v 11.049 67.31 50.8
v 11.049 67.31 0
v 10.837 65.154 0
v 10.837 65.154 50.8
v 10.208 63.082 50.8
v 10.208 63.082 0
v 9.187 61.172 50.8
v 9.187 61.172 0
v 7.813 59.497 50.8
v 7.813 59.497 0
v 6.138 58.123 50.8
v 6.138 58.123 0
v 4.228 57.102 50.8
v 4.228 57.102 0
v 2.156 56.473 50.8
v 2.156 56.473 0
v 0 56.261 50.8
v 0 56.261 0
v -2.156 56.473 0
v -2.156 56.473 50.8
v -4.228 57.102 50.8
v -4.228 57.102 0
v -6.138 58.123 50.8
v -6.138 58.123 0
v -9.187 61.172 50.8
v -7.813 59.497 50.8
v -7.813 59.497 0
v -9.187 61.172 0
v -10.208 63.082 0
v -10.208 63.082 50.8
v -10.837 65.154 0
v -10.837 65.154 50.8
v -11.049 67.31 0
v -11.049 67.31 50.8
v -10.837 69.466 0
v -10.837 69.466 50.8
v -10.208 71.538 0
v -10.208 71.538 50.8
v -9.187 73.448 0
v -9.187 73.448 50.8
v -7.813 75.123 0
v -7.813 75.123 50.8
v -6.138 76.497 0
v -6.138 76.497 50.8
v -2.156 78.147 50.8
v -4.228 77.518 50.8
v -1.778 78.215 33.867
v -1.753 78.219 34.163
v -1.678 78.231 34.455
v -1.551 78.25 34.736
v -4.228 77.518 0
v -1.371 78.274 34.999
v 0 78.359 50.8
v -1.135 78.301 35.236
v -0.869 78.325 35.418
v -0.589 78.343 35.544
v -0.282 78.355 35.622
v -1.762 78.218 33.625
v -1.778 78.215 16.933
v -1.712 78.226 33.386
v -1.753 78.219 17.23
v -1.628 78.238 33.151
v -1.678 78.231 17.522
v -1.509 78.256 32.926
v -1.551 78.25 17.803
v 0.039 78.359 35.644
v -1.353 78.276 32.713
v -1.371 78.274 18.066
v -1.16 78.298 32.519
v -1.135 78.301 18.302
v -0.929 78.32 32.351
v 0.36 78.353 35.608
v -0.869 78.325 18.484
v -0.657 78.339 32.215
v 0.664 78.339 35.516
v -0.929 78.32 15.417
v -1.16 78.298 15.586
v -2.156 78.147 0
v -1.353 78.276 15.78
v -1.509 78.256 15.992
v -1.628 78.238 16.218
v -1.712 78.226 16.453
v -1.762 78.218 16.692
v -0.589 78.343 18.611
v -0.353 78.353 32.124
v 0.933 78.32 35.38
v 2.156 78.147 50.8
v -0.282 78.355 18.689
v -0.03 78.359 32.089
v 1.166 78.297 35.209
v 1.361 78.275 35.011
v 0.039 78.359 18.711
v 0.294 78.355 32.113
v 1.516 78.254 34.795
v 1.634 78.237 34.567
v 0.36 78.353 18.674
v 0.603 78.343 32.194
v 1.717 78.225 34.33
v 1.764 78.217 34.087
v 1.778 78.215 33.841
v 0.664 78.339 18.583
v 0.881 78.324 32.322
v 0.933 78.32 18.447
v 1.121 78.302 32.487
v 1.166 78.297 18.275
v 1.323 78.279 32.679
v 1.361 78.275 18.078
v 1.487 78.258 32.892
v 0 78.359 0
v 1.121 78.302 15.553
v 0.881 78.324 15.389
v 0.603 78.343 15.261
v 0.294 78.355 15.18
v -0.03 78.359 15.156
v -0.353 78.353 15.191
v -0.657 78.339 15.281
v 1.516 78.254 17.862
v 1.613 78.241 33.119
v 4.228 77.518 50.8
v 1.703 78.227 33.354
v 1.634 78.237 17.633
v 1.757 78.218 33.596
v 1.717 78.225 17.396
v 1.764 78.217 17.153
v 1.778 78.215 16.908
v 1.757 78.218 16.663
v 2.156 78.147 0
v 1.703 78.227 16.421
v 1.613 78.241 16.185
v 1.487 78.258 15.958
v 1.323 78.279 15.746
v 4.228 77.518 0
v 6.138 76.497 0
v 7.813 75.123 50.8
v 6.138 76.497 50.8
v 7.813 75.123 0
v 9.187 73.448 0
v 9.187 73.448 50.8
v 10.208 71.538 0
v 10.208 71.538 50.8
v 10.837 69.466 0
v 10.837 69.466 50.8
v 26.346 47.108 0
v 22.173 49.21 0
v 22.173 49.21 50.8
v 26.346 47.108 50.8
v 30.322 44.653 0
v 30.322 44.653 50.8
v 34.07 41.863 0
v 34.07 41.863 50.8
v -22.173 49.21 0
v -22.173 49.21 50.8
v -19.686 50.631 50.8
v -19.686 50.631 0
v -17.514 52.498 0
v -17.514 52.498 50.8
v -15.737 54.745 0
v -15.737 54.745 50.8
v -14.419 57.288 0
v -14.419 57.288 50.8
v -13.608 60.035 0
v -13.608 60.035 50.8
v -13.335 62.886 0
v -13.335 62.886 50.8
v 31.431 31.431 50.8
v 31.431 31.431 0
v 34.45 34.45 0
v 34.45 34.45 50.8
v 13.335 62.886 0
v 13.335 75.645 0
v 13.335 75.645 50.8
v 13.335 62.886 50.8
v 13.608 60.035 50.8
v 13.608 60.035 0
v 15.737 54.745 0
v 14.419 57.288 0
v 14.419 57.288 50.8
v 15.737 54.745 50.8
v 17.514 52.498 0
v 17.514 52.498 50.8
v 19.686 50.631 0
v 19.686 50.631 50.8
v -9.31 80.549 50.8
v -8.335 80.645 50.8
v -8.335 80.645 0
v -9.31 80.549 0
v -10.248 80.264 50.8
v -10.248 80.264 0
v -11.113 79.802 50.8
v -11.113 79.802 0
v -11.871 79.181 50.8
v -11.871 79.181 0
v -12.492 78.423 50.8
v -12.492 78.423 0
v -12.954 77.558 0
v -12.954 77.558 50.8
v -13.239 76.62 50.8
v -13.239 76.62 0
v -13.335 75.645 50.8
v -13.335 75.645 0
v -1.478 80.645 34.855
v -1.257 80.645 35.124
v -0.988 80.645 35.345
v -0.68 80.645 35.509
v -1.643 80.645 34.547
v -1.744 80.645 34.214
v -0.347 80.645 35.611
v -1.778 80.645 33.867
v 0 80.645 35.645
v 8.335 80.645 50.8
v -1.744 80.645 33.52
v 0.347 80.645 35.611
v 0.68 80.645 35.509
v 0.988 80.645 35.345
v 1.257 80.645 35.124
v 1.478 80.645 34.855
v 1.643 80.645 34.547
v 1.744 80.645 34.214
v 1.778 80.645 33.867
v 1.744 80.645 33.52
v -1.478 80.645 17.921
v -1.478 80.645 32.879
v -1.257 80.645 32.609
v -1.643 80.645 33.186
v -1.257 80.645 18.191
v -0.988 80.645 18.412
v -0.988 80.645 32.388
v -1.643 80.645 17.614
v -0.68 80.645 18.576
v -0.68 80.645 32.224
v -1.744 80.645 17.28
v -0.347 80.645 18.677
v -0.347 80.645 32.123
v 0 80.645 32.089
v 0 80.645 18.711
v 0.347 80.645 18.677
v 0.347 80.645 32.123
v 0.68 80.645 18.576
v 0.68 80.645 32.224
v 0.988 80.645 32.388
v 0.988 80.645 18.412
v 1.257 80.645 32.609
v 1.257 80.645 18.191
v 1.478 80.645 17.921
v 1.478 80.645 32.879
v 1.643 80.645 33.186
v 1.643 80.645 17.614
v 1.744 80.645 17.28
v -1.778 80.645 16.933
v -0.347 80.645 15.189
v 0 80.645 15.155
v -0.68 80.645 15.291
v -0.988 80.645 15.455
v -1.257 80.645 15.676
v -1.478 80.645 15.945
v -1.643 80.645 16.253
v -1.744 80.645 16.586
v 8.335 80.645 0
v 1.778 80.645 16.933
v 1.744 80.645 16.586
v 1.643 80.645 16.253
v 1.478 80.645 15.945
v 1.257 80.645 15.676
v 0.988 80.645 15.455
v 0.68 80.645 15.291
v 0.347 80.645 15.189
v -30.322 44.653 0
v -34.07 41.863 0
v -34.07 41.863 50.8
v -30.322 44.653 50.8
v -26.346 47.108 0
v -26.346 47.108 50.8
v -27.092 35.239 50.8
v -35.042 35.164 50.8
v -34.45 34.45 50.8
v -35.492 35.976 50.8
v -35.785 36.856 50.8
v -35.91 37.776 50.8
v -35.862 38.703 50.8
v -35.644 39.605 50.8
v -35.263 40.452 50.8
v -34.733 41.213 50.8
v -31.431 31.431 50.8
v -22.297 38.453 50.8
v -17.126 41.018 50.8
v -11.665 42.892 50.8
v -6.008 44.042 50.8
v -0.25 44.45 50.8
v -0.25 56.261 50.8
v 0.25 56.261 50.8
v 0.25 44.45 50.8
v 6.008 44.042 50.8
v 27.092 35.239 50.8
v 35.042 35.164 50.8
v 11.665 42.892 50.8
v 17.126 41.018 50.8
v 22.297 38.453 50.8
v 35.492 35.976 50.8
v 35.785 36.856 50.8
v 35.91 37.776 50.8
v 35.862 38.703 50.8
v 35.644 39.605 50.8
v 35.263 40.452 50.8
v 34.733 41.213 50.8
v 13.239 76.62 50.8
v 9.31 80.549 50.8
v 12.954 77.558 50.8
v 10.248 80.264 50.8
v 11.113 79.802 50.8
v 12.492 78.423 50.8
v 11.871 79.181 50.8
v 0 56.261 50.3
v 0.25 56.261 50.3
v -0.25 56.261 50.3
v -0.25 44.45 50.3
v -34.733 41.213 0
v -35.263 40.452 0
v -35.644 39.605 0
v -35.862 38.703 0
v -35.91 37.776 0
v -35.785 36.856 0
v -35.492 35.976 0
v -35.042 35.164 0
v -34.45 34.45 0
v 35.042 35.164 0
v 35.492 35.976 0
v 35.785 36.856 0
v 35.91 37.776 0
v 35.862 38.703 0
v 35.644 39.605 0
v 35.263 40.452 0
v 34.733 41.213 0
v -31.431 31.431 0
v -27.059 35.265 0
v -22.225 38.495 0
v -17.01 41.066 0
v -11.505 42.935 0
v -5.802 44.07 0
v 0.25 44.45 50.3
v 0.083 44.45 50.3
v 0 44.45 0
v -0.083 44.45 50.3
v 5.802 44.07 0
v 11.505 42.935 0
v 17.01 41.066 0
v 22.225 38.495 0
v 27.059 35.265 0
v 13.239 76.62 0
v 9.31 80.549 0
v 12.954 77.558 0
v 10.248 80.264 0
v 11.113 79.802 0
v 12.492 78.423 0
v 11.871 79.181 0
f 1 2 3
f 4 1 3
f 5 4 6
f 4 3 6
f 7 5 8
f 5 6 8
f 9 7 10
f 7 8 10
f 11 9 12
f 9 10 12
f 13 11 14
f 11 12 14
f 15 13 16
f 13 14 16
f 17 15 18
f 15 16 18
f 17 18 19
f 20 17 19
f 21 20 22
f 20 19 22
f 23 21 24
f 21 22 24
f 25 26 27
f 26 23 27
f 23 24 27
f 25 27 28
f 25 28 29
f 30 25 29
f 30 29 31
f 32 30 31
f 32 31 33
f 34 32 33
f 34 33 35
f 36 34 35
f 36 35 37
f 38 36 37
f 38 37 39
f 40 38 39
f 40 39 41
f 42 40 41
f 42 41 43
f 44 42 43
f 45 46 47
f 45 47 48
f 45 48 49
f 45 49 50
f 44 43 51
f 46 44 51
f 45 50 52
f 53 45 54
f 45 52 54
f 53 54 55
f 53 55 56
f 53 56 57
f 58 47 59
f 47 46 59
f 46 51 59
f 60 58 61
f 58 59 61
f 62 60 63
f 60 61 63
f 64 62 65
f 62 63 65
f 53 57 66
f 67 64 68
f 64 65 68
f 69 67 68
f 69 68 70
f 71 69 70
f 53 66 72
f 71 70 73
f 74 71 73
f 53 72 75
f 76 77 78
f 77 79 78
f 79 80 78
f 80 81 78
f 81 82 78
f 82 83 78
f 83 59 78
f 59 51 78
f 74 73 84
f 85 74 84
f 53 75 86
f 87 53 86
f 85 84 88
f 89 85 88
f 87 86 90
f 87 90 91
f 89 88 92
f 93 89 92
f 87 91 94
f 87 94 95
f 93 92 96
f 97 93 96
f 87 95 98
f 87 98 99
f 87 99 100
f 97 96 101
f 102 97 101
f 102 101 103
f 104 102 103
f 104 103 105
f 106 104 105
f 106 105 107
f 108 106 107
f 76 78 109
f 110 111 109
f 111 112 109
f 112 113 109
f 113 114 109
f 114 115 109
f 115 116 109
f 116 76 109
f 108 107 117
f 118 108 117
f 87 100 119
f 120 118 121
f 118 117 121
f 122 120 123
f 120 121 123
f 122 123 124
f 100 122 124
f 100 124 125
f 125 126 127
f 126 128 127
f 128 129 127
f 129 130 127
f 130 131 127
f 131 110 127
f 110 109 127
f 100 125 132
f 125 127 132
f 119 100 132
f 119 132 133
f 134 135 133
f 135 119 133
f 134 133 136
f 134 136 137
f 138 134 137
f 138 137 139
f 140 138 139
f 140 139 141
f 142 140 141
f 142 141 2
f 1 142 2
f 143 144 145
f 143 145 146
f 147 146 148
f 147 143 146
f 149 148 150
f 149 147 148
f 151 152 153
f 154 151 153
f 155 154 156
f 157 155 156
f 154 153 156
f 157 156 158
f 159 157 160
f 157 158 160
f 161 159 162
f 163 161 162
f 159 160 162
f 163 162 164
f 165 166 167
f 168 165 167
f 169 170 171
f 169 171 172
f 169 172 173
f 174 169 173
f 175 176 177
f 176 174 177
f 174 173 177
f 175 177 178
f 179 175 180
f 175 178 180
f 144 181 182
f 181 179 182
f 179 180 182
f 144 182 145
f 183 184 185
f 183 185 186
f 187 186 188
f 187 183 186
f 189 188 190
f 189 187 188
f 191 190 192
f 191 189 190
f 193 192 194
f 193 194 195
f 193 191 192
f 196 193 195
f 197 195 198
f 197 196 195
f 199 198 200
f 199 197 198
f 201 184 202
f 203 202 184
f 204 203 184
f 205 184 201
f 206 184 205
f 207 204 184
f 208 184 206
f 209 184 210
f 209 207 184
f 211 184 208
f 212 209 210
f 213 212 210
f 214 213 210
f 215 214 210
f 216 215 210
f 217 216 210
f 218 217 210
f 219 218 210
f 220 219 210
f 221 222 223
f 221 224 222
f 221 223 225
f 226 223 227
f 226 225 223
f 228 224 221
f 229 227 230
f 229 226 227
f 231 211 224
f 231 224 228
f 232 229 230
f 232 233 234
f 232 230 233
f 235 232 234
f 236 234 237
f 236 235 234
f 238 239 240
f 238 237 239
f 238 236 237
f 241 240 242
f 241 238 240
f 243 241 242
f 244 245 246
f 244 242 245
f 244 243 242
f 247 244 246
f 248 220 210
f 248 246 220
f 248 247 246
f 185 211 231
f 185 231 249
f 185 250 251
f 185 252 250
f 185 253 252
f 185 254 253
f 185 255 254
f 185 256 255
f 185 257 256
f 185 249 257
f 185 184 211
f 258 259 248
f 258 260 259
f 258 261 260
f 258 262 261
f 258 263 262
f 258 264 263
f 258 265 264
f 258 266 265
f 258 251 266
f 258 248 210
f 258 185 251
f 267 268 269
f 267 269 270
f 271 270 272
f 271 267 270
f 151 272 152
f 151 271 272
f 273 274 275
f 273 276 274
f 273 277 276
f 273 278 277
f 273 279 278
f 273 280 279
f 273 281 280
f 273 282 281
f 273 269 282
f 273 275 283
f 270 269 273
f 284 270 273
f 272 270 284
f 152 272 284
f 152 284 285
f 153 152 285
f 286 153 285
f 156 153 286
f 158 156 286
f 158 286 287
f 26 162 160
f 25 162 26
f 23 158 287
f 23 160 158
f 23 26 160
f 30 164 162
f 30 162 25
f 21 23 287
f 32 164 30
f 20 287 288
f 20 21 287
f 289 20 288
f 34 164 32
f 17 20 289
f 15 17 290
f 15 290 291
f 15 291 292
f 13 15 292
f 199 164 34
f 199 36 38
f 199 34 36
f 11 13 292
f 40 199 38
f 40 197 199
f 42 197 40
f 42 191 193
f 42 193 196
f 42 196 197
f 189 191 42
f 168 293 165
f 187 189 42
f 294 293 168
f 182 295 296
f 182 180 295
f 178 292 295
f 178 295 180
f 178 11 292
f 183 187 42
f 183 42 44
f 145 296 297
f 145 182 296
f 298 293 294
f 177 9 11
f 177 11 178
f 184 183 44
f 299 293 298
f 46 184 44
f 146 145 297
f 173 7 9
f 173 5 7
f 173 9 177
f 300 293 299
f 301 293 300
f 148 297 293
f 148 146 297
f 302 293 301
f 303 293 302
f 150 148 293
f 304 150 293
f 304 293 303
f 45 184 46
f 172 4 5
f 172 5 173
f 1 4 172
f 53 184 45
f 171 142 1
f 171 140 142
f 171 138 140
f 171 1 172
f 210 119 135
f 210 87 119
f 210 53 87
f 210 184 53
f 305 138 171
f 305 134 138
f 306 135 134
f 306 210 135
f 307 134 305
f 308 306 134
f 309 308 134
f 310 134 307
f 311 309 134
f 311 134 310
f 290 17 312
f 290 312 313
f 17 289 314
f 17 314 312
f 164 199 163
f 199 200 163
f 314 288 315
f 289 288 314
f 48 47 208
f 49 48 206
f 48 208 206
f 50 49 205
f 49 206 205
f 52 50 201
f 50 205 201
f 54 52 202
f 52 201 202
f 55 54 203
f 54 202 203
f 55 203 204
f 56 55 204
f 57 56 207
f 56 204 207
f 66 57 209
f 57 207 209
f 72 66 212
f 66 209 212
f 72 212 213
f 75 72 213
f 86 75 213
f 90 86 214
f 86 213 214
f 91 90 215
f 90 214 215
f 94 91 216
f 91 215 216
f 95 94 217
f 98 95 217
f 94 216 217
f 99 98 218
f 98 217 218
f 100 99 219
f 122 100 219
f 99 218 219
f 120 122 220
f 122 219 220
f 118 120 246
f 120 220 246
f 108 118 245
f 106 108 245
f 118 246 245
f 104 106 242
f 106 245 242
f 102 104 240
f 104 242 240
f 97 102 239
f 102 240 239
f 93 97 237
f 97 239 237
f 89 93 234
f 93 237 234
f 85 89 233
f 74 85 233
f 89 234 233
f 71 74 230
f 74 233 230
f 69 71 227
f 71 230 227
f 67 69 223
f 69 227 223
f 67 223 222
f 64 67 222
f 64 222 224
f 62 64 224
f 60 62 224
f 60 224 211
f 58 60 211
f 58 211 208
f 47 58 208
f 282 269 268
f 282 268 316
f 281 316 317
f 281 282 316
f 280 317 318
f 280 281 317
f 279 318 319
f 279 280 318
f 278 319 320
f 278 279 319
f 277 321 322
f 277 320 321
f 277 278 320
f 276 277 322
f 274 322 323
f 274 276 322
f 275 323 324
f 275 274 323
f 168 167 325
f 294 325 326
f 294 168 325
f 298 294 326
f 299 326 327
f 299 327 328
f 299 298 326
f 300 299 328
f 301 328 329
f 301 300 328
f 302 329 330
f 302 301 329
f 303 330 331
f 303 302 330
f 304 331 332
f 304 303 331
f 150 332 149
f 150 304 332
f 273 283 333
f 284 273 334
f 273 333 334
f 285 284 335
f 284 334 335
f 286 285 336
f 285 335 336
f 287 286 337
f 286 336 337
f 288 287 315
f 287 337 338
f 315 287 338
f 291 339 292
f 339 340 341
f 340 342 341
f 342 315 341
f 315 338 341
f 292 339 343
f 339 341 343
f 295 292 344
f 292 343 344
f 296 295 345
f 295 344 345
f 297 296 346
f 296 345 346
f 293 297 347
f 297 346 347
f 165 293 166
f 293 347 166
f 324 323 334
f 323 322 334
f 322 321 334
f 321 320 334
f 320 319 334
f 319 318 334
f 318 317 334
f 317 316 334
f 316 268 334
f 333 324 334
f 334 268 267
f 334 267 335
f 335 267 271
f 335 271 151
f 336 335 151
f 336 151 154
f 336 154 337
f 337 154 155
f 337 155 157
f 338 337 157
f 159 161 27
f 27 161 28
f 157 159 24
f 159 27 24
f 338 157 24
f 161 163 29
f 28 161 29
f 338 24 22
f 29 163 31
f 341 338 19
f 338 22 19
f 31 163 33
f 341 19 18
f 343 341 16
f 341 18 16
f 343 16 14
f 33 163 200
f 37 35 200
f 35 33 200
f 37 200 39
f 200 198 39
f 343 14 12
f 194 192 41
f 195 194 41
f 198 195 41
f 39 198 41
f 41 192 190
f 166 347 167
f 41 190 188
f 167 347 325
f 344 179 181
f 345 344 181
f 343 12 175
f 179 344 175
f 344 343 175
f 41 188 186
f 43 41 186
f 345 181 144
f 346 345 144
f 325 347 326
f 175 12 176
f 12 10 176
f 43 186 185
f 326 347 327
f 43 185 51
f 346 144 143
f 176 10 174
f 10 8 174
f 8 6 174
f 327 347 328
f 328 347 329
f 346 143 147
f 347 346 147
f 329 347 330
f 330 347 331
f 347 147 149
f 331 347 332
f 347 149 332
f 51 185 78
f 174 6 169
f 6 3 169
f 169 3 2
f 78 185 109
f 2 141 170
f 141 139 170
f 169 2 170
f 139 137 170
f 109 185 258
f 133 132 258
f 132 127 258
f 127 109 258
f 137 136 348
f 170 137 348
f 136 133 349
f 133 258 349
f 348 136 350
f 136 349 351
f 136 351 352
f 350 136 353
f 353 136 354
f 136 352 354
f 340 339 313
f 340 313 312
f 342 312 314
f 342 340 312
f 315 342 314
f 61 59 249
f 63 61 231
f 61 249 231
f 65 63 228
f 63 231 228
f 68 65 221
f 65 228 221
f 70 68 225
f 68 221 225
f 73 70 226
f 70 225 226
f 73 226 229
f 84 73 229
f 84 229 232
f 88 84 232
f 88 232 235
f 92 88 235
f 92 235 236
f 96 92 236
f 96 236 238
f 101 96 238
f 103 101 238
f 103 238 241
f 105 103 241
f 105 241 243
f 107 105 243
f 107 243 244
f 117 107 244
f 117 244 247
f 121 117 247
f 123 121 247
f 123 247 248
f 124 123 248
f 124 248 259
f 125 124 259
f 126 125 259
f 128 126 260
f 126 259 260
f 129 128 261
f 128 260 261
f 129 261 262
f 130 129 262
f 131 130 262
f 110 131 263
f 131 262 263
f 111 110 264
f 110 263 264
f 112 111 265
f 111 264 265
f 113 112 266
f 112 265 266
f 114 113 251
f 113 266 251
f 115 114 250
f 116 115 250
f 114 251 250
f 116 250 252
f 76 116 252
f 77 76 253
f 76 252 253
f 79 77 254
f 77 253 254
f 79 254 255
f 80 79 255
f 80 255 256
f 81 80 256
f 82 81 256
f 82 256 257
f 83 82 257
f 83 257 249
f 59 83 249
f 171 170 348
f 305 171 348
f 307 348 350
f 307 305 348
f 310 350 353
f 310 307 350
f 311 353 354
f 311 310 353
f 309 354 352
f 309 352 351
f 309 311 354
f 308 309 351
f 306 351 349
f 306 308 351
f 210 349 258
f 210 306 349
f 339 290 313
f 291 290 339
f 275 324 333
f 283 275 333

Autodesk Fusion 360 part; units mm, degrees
sketch "Sketch1" plane through (0, 0, 0) normal (0, 0, 1) x (1, 0, 0)
  circle A0 centre (0, 0) radius 44.45
  arc A1 (38.1661, 38.1661) -> (-38.1661, 38.1661) centre (0, 0) ccw
  line L0 (0, 0) -> (38.1661, 38.1661) construction
  line L1 (0, 0) -> (-38.1661, 38.1661) construction
  line L2 (-38.1661, 38.1661) -> (-31.4309, 31.4309) construction
  line L3 (-38.1661, 38.1661) -> (-31.4309, 31.4309)
  line L4 (31.4309, 31.4309) -> (38.1661, 38.1661)
  line L5 (0, 0) -> (0, 53.975) construction
  line L6 (0, 53.975) -> (-31.4309, 31.4309) construction
  line L7 (0, 53.975) -> (31.4309, 31.4309) construction
  line L8 (-13.335, 80.645) -> (13.335, 80.645)
  line L9 (13.335, 80.645) -> (13.335, 53.975)
  line L10 (13.335, 53.975) -> (-13.335, 53.975) construction
  line L11 (-13.335, 53.975) -> (-13.335, 80.645)
  line L12 (-13.335, 53.975) -> (-13.335, 52.3018)
  line L13 (13.335, 53.975) -> (13.335, 52.3018)
  line L14 (-13.335, 67.31) -> (13.335, 67.31) construction
  circle A2 centre (0, 67.31) radius 11.049
  point P0 (-31.4309, 31.4309)
  point P1 (-13.335, 52.3018)
  point P2 (13.335, 52.3018)
  point P3 (-13.335, 67.31)
  point P4 (13.335, 67.31)
  dimension "d1" = 88.9
  dimension "d2" = 90
  dimension "d3" = 9.525
  dimension "d6" = 26.67
  dimension "d7" = 26.67
  dimension "d8" = 22.098
extrude "Extrude2" add sketch "Sketch1" along normal blind 50.8 contours A0 A1 L3 L4 | A1 L8 L9 L11 L12 L13
fillet "Fillet1" radius 5 2 edges at (-38.1661, 38.1661, 25.4) (38.1661, 38.1661, 25.4)
fillet "Fillet2" radius 15 2 edges at (-13.335, 52.3018, 25.4) (13.335, 52.3018, 25.4)
fillet "Fillet3" radius 5 2 edges at (-13.335, 80.645, 25.4) (13.335, 80.645, 25.4)
sketch "Sketch4" plane through (0, 80.645, 0) normal (0, 1, 0) x (-1, 0, 0)
  line L0 (-8.335, 50.8) -> (-8.335, 0)
  line L1 (-8.335, 0) -> (8.335, 0)
  line L2 (8.335, 0) -> (8.335, 50.8)
  line L3 (8.335, 50.8) -> (-8.335, 50.8)
  line L4 (0, 0) -> (0, 16.9333) construction
  line L5 (0, 16.9333) -> (0, 33.8667) construction
  line L6 (0, 33.8667) -> (0, 50.8) construction
  circle A0 centre (0, 16.9333) radius 1.778
  circle A1 centre (0, 33.8667) radius 1.778
  dimension "d17" = 3.556
  dimension "d18" = 3.556
extrude "Extrude3" cut sketch "Sketch4" along normal up to surface contours A0 | A1 end surface at (10.9941, 66.2099, 33.8667)
sketch "Sketch6" plane through (0, 0, 50.8) normal (0, 0, 1) x (-1, 0, 0)
  arc A0 (-13.335, -75.645) -> (-8.335, -80.645) centre (-8.335, -75.645) ccw
  line L0 (-8.335, -80.645) -> (8.335, -80.645)
  arc A1 (8.335, -80.645) -> (13.335, -75.645) centre (8.335, -75.645) ccw
  line L1 (13.335, -75.645) -> (13.335, -62.8862)
  arc A2 (22.173, -49.2104) -> (13.335, -62.8862) centre (28.335, -62.8862) ccw
  arc A3 (22.173, -49.2104) -> (34.0702, -41.8632) centre (0, 0) ccw
  arc A4 (34.0702, -41.8632) -> (34.4496, -34.4496) centre (30.9141, -37.9851) ccw
  line L2 (34.4496, -34.4496) -> (31.4309, -31.4309)
  arc A5 (-31.4309, -31.4309) -> (31.4309, -31.4309) centre (0, 0) ccw
  line L3 (-31.4309, -31.4309) -> (-34.4496, -34.4496)
  arc A6 (-34.4496, -34.4496) -> (-34.0702, -41.8632) centre (-30.9141, -37.9851) ccw
  arc A7 (-34.0702, -41.8632) -> (-22.173, -49.2104) centre (0, 0) ccw
  arc A8 (-13.335, -62.8862) -> (-22.173, -49.2104) centre (-28.335, -62.8862) ccw
  line L4 (-13.335, -62.8862) -> (-13.335, -75.645)
  circle A9 centre (0, -67.31) radius 11.049
  line L5 (0, -56.261) -> (0, -44.45)
  circle A10 centre (0, -67.31) radius 11.049
  circle A11 centre (0, 0) radius 44.45
  line L6 (0.25, -56.261) -> (-0.25, -56.261)
  line L7 (-0.25, -56.261) -> (-0.25, -44.45)
  line L8 (-0.25, -44.45) -> (0.25, -44.45)
  line L9 (0.25, -44.45) -> (0.25, -56.261)
  line L10 (0, 0) -> (0, -53.975)
  dimension "d22" = 0.5
extrude "Extrude4" cut sketch "Sketch6" against normal blind 0.5 contours L5 L6 L8 L9 L10 | L5 L6 L7 L8 L10
